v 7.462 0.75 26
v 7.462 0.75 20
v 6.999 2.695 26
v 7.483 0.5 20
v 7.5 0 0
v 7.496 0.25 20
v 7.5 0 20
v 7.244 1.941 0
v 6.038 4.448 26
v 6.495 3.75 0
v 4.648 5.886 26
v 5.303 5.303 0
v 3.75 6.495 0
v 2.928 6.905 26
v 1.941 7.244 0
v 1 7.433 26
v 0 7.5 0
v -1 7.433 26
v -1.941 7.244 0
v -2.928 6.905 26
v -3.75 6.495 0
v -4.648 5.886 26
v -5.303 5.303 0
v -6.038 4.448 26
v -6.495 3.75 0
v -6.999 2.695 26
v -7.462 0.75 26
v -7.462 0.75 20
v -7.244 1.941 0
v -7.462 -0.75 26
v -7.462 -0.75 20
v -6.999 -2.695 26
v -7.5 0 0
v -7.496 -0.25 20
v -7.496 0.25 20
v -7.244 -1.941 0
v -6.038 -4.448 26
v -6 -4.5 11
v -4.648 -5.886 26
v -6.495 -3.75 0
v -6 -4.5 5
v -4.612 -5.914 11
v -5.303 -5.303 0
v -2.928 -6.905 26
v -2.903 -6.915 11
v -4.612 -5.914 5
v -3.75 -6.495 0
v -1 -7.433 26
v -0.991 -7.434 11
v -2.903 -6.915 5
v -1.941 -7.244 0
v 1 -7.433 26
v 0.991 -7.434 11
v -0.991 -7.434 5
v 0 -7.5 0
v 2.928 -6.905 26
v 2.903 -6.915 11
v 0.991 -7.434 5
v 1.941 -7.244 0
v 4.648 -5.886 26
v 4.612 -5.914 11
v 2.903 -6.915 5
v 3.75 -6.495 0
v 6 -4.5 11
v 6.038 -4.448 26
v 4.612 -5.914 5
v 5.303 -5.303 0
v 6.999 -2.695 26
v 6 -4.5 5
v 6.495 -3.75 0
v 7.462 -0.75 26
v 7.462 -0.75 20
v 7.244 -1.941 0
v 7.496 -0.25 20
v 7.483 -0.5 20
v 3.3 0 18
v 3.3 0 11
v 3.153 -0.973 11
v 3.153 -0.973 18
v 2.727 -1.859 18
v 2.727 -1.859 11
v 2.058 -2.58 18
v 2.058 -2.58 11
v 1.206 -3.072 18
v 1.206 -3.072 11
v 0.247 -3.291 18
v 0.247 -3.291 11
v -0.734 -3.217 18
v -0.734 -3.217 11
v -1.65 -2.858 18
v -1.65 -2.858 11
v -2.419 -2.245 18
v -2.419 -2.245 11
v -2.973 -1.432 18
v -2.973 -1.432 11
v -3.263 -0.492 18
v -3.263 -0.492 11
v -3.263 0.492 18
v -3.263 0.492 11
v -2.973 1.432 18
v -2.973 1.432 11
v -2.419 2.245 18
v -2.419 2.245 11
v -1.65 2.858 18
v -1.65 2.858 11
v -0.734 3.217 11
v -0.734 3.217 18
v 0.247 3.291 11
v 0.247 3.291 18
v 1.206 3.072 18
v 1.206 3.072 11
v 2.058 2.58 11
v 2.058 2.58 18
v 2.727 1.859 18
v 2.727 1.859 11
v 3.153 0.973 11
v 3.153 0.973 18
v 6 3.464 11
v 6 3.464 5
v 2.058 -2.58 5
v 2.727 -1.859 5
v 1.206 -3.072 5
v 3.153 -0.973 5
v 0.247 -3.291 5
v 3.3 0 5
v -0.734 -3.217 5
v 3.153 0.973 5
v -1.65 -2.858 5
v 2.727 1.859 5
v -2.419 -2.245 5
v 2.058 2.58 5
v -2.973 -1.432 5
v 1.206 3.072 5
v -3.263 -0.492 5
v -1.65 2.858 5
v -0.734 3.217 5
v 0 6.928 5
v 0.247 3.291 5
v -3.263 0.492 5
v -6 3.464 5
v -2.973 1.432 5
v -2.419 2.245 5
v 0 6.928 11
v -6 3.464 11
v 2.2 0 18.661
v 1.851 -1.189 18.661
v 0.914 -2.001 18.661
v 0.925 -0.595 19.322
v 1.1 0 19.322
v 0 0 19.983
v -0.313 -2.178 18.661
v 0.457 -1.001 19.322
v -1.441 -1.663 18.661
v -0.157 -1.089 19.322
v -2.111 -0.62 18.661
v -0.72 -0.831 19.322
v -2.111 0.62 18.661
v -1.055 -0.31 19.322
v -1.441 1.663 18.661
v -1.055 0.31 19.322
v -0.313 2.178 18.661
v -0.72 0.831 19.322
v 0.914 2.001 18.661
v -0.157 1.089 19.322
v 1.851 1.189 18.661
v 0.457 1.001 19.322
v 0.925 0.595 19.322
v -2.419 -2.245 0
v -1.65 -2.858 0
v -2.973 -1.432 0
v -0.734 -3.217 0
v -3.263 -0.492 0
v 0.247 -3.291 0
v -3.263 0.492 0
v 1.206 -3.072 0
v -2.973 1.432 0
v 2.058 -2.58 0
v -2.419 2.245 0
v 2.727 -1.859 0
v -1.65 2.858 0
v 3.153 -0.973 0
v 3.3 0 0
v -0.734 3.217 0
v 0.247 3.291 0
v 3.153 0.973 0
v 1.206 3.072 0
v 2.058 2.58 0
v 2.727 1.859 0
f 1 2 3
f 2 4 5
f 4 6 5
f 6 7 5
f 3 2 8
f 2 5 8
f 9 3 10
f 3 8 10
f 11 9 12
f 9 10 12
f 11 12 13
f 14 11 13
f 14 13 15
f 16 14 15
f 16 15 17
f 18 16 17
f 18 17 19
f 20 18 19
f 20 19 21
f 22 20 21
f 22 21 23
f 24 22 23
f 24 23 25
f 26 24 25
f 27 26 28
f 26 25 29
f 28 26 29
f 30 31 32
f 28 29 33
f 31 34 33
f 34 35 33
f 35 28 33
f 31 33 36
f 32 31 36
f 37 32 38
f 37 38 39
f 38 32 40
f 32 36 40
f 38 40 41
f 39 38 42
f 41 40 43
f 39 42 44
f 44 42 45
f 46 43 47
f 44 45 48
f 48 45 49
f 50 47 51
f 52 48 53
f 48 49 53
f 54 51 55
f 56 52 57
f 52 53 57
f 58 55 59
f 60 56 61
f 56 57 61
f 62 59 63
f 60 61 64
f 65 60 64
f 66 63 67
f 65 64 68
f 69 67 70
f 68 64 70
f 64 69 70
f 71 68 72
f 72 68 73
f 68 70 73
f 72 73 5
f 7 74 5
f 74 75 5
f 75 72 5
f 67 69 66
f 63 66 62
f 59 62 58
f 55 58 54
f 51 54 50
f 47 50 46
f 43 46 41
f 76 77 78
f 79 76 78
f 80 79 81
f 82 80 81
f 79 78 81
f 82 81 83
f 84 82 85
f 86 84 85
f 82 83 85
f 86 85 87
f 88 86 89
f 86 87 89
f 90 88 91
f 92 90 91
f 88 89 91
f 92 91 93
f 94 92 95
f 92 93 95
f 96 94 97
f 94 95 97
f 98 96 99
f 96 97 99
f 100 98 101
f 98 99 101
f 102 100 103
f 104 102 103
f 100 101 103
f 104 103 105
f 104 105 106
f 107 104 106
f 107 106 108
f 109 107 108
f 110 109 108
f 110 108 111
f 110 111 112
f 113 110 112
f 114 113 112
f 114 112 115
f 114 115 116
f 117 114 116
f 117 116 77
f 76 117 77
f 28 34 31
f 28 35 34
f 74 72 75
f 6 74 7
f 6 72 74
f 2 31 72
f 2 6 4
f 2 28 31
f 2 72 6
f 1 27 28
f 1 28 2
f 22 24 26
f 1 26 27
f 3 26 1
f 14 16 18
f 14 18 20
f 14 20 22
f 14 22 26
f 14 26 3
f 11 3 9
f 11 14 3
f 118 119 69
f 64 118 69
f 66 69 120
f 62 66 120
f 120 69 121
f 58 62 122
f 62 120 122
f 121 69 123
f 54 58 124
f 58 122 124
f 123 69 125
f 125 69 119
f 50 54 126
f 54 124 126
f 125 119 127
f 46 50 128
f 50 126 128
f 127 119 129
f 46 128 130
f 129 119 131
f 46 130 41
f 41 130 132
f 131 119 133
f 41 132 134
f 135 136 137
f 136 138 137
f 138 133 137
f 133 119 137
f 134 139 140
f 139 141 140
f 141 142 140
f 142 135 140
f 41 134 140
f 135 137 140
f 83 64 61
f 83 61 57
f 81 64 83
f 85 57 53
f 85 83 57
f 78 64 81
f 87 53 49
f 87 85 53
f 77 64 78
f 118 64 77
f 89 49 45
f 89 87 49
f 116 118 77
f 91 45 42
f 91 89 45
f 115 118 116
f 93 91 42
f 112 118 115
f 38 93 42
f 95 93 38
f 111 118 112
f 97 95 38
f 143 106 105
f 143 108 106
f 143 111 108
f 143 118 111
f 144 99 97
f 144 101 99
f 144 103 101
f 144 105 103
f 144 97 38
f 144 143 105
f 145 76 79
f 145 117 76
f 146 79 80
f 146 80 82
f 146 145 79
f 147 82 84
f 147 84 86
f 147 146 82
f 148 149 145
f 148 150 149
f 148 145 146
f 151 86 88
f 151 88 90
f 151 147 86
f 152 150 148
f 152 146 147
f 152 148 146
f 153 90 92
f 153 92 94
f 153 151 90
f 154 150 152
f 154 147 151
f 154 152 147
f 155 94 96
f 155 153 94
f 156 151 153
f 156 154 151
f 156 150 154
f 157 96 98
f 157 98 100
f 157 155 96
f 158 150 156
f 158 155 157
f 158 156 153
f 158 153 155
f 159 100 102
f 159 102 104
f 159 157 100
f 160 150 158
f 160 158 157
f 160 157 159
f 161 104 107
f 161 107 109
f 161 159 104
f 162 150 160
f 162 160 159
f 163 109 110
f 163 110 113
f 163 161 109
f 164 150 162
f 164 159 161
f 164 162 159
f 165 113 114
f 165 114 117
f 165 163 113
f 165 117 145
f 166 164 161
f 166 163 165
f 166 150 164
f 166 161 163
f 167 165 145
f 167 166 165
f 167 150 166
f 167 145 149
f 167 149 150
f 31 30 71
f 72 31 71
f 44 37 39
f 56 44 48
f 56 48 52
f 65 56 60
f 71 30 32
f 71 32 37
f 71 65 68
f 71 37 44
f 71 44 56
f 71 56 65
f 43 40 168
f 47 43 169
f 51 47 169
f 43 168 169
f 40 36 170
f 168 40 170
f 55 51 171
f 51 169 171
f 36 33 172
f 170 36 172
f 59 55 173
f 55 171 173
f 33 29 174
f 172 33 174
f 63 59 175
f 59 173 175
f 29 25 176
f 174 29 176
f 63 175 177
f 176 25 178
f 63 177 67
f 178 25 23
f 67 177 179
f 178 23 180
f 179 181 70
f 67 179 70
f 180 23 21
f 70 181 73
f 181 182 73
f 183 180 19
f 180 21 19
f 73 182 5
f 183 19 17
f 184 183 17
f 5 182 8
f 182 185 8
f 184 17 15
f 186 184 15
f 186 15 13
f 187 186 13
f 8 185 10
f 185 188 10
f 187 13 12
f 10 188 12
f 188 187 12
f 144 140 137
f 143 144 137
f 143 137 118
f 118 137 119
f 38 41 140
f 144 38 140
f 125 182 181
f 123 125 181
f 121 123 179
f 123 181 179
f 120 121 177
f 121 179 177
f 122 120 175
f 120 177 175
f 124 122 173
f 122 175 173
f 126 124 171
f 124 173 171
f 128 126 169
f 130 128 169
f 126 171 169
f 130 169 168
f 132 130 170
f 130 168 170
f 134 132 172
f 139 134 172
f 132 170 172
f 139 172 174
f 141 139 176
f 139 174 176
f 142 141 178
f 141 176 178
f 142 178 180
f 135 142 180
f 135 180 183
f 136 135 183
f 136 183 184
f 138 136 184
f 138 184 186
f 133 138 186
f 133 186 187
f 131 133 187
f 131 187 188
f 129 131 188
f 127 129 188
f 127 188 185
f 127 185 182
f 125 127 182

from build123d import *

# Parameters (mm, degrees)
PAD001_DEPTH = 6
SKETCH_R     = 7.5
PAD_DEPTH    = 26
SKETCH003_W  = 17.6
SKETCH003_H  = 1.5
POCKET_DEPTH = 6
SKETCH004_R  = 3.3
HOLE_DEPTH   = 18
HOLE_TIPS_R  = 3.3


with BuildPart() as body001:
    # Sketch002 → Pad001 (new body)
    with BuildSketch(Plane.XY.offset(5)):
        Polygon((6, 3.464102), (6, -26.535898), (-6, -26.535898), (-6, 3.464102), (0, 6.928203), align=None)
    extrude(amount=PAD001_DEPTH)


with BuildPart() as body:
    # Sketch → Pad (new body)
    with BuildSketch(Plane.XY):
        Circle(SKETCH_R)
    extrude(amount=PAD_DEPTH)

    # Boolean: cut Body001
    add(body001.part, mode=Mode.SUBTRACT)

    # Sketch003 (on Face3 of Boolean) → Pocket (cut)
    with BuildSketch(Plane.XY.offset(26)):
        Rectangle(SKETCH003_W, SKETCH003_H)
    extrude(amount=-POCKET_DEPTH, mode=Mode.SUBTRACT)

    # Sketch004 (on Face7 of Pocket) → Hole (cut)
    with BuildSketch(Plane(origin=(0, 0, 0), x_dir=(1, 0, 0), z_dir=(0, 0, -1))):
        Circle(SKETCH004_R)
    extrude(amount=-HOLE_DEPTH, mode=Mode.SUBTRACT)

    # Hole tips → Hole tip 1 section 0
    with BuildSketch(Plane(origin=(0, 0, 18), x_dir=(1, 0, 0), z_dir=(0, 0, -1)), mode=Mode.PRIVATE) as hole_tip_1_s0:
        Circle(HOLE_TIPS_R)
    loft([hole_tip_1_s0.sketch, Vertex(0, 0, 19.98284)], mode=Mode.SUBTRACT)


solid = body.part
